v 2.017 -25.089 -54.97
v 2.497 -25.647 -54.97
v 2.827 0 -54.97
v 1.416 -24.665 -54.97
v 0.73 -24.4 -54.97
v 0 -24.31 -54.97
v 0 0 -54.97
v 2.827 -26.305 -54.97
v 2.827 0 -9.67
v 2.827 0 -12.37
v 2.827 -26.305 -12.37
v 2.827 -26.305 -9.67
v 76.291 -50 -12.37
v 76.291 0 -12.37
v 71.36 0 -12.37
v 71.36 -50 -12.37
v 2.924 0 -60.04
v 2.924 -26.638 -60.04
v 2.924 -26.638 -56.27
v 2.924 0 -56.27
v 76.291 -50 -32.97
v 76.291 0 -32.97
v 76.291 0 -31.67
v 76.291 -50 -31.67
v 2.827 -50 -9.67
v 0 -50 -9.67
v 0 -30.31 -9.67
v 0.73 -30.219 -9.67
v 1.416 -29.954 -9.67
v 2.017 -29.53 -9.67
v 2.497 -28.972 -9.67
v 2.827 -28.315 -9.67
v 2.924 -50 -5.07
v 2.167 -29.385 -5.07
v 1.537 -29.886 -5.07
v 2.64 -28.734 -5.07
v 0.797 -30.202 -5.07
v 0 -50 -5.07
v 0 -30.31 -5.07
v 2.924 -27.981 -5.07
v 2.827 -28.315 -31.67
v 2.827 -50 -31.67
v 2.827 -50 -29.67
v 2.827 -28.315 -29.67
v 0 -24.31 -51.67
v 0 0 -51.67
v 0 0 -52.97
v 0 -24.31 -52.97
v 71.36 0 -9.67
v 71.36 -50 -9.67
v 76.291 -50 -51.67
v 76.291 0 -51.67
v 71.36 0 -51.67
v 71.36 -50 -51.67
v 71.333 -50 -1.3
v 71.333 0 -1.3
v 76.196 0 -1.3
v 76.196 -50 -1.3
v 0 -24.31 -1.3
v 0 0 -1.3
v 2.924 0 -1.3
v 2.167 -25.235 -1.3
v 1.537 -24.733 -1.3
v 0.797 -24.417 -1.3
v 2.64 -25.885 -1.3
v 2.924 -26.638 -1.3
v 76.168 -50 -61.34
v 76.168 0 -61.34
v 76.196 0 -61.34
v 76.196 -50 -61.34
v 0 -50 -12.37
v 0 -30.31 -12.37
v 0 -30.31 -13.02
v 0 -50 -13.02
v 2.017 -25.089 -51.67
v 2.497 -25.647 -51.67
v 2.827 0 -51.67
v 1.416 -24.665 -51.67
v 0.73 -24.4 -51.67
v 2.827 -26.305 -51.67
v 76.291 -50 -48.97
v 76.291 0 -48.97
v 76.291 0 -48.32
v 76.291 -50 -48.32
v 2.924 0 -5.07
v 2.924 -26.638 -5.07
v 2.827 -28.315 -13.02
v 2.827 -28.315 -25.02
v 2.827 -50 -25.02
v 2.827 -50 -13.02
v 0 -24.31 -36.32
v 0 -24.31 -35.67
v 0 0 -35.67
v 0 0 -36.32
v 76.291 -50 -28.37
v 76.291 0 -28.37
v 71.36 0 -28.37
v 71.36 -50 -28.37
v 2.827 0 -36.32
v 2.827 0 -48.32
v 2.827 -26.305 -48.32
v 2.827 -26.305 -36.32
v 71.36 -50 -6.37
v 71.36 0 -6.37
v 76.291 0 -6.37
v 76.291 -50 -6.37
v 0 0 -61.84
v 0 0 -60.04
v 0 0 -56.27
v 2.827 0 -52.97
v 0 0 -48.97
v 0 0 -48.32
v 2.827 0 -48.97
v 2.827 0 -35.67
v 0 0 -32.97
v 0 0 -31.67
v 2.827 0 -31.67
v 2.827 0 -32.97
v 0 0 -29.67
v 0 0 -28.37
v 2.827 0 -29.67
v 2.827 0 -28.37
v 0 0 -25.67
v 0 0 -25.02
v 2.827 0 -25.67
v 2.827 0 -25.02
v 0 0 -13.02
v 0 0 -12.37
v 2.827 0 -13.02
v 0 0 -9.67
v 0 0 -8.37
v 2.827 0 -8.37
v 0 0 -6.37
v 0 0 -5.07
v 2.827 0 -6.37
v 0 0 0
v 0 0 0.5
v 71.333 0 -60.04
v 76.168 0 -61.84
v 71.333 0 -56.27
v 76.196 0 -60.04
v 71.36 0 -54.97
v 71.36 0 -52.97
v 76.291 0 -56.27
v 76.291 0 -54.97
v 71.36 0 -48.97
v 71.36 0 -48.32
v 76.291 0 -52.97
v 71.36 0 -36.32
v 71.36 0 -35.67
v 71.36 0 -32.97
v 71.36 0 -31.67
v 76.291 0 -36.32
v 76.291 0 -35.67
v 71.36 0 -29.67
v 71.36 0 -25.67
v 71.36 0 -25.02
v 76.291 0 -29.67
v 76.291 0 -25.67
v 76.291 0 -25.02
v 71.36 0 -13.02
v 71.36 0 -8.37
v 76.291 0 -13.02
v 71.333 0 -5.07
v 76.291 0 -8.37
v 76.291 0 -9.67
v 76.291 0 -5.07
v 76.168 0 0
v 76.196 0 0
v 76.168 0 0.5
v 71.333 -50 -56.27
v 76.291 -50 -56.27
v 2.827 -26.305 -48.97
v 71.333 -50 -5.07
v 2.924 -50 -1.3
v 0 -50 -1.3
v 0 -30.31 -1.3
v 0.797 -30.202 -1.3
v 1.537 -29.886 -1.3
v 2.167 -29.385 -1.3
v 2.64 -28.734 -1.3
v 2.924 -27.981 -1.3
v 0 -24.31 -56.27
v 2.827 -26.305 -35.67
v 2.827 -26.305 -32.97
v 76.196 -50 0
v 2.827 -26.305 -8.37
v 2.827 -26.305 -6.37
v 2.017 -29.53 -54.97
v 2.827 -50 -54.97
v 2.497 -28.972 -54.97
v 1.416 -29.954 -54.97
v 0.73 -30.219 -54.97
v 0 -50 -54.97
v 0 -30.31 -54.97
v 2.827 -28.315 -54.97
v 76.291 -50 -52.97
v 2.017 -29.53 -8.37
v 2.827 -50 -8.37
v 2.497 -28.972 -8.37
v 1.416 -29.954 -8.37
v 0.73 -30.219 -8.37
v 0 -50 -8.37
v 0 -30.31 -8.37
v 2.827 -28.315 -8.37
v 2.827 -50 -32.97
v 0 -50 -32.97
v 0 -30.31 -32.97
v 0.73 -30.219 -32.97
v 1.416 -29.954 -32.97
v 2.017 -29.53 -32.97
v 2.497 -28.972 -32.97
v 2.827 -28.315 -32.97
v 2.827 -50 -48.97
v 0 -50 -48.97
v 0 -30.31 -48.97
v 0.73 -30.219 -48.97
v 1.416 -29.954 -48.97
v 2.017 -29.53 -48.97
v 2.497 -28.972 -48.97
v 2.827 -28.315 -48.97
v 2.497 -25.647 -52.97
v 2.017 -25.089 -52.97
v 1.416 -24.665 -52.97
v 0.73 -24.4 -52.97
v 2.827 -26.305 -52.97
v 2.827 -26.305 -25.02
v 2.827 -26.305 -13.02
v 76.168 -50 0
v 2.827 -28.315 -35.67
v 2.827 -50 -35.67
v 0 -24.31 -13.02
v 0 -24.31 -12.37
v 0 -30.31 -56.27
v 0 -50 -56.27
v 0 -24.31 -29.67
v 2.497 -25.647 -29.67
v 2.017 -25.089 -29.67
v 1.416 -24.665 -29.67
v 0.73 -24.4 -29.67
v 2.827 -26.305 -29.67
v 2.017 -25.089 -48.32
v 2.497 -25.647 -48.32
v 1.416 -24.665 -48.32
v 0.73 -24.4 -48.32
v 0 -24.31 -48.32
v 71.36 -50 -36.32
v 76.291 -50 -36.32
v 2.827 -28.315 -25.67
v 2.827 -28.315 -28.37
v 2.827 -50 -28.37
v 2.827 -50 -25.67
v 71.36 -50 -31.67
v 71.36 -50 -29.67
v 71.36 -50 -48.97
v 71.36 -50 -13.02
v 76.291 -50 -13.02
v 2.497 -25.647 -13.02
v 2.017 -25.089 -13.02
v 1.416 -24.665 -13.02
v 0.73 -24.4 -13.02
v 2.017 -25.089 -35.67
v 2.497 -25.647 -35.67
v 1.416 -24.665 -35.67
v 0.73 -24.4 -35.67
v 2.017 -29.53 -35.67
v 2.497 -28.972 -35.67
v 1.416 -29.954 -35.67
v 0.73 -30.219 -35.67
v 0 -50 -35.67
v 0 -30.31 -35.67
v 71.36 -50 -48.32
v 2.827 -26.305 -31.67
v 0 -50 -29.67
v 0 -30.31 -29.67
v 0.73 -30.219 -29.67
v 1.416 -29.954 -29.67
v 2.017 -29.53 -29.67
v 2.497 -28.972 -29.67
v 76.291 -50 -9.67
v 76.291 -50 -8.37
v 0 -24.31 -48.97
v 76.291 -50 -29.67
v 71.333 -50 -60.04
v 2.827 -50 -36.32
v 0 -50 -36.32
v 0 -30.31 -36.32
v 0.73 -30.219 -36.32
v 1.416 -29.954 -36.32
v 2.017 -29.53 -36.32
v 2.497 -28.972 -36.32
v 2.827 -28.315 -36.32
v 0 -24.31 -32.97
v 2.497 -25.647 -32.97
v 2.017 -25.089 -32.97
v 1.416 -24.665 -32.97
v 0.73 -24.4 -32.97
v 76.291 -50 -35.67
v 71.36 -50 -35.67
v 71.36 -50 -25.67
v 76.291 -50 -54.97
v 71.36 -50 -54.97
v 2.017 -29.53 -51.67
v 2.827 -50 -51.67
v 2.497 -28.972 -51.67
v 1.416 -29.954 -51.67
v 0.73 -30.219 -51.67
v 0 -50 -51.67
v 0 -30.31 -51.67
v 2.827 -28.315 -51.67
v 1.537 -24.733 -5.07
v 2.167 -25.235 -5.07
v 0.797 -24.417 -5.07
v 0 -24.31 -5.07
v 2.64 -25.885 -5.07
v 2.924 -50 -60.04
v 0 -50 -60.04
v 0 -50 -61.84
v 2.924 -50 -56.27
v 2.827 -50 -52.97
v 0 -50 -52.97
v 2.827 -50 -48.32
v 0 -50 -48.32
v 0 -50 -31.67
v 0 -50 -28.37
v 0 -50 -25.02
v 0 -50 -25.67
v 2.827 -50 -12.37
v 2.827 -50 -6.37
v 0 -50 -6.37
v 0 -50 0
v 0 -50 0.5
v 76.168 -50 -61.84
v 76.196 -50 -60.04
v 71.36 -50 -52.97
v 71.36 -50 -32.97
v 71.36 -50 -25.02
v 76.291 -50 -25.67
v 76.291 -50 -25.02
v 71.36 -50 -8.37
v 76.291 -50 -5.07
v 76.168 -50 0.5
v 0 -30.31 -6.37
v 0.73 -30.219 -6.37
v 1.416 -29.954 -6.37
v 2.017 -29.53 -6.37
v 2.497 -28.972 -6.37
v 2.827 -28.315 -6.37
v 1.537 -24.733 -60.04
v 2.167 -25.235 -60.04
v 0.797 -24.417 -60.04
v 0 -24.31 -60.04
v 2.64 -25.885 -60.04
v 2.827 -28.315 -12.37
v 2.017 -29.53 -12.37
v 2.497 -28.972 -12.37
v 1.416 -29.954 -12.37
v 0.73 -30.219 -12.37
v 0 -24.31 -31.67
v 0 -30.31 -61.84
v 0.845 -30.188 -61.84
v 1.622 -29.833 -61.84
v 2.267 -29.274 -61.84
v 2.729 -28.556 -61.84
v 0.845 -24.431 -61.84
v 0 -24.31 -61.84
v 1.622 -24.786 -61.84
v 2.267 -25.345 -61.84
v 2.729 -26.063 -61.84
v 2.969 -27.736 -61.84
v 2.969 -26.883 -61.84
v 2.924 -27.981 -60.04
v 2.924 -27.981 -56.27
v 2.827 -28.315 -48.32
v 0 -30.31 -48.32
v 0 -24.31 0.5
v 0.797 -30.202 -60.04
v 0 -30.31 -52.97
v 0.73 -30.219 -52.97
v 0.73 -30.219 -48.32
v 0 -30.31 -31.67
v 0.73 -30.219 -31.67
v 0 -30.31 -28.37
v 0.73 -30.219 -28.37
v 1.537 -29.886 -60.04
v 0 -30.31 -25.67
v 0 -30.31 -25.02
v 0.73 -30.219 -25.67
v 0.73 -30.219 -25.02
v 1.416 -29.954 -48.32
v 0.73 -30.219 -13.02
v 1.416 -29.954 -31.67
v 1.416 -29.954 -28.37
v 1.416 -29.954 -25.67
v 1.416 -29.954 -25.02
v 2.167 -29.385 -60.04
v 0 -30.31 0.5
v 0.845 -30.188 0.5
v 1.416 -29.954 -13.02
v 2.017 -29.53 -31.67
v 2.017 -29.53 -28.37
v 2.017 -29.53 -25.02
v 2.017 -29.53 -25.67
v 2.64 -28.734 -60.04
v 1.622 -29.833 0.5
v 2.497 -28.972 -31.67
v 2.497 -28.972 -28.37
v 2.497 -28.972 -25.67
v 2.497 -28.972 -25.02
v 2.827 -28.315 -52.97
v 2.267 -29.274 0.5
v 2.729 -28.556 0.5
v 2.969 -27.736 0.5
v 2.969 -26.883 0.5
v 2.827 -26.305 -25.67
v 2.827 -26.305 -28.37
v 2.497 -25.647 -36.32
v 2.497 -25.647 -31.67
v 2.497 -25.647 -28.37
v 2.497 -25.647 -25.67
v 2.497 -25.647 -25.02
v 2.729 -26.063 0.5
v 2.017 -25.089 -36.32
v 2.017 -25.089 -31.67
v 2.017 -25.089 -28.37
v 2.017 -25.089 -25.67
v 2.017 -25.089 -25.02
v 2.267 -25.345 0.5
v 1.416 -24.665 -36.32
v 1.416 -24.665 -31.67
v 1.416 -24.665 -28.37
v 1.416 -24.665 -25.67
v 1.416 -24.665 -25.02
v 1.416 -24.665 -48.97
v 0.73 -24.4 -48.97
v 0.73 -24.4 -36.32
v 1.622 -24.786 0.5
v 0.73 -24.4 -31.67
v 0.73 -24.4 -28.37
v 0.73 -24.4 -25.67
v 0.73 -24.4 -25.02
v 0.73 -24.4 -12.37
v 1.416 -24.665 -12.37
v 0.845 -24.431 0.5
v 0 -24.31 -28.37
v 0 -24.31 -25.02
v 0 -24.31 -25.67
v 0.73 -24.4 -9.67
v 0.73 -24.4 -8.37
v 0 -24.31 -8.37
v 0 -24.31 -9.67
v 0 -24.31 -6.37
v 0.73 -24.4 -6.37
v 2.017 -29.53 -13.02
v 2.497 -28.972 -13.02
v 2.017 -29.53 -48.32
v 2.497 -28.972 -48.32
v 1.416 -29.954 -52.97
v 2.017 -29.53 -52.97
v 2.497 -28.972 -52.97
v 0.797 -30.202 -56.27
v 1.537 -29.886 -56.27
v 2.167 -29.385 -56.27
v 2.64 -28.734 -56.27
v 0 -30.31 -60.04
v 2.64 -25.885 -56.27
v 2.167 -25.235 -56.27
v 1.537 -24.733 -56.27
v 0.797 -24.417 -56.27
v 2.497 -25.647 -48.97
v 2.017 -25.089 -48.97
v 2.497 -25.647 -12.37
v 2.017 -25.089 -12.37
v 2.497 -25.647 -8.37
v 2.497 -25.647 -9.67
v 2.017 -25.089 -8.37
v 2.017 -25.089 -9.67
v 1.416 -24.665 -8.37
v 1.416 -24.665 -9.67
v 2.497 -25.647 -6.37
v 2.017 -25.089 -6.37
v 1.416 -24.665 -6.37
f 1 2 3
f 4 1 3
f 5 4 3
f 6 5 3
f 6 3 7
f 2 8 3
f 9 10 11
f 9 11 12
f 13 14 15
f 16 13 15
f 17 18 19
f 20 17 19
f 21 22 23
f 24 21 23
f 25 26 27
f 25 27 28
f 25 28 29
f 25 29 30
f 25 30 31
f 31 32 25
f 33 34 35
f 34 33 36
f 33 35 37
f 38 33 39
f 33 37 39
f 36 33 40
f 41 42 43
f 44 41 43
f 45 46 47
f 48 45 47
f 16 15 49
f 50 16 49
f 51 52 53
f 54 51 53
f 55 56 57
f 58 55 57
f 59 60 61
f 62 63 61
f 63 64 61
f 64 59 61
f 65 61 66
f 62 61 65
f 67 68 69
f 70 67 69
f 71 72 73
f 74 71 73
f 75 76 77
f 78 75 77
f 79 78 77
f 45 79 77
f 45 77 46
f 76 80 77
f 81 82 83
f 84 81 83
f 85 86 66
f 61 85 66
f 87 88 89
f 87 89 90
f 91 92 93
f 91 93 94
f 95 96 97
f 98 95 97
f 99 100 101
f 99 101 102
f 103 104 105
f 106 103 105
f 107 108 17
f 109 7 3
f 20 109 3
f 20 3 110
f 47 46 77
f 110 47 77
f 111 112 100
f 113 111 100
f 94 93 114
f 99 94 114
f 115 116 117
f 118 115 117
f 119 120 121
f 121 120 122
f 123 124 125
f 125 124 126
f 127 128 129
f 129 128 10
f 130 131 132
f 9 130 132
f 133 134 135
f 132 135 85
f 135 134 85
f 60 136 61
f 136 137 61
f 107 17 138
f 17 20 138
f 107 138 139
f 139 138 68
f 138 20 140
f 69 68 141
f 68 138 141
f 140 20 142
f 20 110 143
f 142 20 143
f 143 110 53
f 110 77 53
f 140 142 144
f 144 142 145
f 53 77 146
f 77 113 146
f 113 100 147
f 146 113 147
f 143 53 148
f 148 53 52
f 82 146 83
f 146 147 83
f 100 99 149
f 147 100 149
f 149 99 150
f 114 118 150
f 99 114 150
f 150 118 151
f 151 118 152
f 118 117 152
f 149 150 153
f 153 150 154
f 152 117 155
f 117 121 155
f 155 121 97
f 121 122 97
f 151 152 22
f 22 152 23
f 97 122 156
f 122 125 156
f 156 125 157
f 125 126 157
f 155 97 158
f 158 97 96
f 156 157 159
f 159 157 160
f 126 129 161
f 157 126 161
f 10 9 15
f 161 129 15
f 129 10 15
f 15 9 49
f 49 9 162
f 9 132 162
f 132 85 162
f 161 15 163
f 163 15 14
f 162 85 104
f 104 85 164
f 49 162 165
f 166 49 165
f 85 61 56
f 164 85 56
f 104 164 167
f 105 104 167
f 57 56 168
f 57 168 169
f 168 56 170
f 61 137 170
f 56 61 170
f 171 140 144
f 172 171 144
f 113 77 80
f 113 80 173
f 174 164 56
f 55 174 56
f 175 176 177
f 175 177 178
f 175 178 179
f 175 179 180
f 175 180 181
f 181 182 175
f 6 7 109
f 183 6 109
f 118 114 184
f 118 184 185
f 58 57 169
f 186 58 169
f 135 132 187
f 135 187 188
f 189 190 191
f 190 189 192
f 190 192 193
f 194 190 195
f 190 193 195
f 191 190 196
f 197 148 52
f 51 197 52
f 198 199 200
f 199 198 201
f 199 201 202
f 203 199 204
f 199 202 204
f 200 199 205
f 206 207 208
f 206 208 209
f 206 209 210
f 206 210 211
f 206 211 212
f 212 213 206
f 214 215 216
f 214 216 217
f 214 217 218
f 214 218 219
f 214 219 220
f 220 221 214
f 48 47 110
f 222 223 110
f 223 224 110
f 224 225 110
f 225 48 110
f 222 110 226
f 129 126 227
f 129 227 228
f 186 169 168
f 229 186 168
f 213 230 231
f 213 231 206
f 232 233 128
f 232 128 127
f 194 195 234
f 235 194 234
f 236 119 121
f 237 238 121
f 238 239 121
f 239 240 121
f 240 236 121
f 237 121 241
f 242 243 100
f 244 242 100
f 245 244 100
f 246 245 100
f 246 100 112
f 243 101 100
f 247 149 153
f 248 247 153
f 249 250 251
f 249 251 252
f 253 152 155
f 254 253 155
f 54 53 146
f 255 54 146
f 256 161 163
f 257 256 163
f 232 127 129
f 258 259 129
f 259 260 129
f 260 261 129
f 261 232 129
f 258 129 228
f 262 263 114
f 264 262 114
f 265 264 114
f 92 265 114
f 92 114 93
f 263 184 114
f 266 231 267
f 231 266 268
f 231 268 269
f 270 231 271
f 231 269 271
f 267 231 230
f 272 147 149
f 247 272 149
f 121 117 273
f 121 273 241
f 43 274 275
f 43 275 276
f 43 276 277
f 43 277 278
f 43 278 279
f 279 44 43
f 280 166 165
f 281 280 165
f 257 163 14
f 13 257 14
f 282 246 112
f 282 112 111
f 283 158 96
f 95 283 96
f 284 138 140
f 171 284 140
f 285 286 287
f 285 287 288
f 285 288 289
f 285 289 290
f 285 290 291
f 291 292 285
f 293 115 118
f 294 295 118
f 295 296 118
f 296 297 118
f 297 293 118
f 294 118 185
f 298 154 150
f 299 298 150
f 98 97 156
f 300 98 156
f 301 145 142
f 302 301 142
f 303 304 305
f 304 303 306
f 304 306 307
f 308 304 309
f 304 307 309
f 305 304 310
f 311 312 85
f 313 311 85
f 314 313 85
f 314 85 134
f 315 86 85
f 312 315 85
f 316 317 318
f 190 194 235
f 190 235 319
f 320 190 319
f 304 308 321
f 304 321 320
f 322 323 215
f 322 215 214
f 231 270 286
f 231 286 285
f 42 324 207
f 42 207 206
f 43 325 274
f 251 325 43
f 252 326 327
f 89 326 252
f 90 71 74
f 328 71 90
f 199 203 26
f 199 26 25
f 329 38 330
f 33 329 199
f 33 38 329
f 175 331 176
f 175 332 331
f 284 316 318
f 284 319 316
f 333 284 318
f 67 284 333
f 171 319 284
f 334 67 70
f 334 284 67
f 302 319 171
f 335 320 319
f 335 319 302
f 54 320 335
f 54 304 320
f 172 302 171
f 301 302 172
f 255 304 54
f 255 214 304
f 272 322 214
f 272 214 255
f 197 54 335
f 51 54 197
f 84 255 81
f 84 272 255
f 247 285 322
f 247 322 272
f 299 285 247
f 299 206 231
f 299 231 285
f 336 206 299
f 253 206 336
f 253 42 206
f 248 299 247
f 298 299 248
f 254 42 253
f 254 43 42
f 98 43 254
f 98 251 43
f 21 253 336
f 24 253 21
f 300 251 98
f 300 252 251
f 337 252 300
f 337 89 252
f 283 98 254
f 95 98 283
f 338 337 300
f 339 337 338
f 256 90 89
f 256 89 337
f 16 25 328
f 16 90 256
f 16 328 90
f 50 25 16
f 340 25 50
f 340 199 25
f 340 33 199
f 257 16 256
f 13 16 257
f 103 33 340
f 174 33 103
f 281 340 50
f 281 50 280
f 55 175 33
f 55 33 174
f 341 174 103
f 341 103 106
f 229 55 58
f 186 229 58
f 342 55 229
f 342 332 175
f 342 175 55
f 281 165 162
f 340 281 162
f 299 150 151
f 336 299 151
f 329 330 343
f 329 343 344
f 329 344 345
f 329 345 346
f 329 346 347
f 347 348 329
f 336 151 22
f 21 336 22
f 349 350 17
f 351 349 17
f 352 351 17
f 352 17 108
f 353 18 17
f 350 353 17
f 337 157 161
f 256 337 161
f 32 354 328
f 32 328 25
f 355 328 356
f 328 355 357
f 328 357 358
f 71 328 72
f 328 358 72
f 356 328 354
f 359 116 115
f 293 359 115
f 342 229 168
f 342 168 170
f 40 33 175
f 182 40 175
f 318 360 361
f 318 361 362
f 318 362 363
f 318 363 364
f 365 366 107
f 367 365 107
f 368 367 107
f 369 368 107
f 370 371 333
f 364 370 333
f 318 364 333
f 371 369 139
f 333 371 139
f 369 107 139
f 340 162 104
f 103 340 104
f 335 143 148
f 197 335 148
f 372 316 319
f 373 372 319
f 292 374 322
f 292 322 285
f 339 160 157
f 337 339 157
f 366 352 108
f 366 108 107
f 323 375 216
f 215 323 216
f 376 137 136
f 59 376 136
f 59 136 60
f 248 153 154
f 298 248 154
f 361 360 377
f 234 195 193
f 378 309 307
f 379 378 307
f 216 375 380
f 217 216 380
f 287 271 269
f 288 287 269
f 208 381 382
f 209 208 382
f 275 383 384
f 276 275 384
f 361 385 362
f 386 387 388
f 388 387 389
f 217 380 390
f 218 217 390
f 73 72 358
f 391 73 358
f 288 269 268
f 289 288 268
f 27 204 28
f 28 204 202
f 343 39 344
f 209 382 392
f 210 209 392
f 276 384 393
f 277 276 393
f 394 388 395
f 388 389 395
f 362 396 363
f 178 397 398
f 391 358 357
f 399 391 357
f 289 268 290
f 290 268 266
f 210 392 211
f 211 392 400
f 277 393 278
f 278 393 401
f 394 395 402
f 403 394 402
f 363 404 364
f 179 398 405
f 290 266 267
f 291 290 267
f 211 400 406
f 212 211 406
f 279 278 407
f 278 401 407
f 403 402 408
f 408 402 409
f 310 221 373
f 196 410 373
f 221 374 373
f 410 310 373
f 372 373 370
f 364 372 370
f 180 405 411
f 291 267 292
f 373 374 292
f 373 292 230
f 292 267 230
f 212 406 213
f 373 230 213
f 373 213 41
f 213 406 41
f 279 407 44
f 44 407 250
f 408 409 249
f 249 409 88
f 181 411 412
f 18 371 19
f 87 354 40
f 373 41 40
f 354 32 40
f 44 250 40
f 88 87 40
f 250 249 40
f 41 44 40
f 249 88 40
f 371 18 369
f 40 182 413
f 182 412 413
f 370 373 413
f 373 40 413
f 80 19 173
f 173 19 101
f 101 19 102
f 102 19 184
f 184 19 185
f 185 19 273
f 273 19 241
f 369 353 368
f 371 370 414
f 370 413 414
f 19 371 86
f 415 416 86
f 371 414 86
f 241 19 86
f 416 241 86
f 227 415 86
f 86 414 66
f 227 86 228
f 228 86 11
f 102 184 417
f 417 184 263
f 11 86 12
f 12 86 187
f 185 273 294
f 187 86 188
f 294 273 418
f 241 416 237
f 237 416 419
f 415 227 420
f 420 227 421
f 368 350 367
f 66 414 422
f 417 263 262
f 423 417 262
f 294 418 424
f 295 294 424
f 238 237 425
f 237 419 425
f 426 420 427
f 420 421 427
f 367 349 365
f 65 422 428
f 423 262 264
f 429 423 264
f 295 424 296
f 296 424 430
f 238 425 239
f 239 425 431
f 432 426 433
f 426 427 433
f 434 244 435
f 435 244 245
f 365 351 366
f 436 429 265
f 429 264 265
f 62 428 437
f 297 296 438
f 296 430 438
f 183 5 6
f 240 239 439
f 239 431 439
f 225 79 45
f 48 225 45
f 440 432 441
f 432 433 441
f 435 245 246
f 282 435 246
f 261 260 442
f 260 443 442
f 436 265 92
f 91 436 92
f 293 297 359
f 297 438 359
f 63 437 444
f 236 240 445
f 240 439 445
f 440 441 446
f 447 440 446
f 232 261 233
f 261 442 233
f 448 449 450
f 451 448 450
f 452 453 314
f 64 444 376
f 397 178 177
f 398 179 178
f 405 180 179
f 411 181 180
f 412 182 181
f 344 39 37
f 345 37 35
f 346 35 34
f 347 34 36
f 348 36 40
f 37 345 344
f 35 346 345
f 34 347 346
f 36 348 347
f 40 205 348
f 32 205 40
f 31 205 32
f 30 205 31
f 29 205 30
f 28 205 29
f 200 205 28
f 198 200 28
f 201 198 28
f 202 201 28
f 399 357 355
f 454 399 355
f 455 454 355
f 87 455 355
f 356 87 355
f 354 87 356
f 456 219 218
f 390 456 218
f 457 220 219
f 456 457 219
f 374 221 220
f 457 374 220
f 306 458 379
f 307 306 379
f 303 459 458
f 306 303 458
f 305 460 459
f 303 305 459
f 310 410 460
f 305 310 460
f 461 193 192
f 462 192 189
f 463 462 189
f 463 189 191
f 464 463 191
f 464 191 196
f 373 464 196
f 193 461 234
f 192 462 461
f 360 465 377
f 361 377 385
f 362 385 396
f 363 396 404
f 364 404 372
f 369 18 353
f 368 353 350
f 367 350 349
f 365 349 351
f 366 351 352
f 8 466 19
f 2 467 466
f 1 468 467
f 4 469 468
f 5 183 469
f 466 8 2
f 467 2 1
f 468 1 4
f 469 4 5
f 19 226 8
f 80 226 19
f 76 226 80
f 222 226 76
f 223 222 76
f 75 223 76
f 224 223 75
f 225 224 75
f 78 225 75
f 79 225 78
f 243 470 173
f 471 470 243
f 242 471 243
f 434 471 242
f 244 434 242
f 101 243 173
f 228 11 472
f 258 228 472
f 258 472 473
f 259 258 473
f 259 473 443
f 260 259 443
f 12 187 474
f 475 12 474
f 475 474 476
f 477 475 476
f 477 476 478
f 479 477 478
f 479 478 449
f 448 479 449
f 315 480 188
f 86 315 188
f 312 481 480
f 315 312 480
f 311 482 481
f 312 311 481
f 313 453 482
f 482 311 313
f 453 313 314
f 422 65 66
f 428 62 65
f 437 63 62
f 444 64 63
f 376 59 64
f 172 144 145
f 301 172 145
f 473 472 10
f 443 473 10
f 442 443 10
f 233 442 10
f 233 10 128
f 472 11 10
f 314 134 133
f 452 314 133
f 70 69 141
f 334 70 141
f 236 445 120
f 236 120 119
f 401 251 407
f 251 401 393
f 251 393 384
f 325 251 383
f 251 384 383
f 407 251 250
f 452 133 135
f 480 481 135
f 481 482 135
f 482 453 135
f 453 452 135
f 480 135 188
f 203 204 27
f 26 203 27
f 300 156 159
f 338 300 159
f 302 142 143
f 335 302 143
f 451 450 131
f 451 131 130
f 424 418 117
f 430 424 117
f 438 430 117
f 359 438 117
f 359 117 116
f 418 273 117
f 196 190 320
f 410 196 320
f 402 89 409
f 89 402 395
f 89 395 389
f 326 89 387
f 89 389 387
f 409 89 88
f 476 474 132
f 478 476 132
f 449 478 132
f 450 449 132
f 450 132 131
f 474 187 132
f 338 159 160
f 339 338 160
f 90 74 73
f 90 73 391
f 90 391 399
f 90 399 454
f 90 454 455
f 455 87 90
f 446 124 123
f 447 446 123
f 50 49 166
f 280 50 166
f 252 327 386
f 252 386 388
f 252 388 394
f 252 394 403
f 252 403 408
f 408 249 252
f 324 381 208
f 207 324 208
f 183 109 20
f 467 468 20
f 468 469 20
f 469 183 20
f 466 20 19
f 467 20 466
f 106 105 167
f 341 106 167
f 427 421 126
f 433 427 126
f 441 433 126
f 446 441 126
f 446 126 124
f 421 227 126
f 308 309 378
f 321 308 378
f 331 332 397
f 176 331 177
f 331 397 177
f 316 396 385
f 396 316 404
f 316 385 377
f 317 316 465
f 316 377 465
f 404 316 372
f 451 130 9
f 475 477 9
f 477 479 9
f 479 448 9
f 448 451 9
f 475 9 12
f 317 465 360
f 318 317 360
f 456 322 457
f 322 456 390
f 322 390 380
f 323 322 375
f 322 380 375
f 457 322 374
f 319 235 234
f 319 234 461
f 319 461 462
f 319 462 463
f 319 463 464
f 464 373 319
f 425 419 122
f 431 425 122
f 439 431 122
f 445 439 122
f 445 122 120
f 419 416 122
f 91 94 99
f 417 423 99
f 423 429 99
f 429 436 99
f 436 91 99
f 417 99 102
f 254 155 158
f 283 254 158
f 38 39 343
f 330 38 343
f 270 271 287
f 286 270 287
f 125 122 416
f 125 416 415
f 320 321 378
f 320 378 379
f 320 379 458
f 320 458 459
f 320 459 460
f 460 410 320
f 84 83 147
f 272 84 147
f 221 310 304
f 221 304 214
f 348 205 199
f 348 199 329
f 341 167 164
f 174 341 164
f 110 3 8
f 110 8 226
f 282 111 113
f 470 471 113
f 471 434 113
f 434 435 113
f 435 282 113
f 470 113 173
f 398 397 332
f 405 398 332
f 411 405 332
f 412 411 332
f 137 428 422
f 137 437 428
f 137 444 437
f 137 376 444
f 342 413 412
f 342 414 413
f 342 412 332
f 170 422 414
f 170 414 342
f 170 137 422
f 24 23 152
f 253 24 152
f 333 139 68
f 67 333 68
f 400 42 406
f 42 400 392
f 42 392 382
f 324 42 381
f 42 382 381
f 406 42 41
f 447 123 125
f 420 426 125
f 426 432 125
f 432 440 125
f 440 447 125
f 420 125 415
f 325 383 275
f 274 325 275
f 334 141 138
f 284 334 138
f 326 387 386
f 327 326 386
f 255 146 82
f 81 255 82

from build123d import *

# Parameters (mm, degrees)
F0_W          = 76.1676803231
F0_H          = 0.5
F0_W_2        = 68.4088433627
F0_H_2        = 3.77
F0_W_3        = 68.5331546701
F0_H_3        = 2.7
F0_H_4        = 2
F0_H_5        = 12
F1_DEPTH      = 50
F2_R          = 3
F3_DEPTH      = 70
F3_DEPTH_BACK = 0.501


with BuildPart() as f1:
    # F0 (on Front) → F1 (new body)
    with BuildSketch(Plane.XZ):
        Polygon((76.1676803231, 0), (0, 0), (0, -1.3), (2.9238497373, -1.3), (71.3326931, -1.3), (76.1956498027, -1.3), (76.1956498027, 0), align=None)
        Polygon((71.3326931, -60.04), (2.9238497373, -60.04), (0, -60.04), (0, -61.34), (76.1676803231, -61.34), (76.1956498027, -61.34), (76.1956498027, -60.04), align=None)
        Polygon((71.3326931, -5.07), (2.9238497373, -5.07), (0, -5.07), (0, -6.37), (2.8266510926, -6.37), (71.3598057628, -6.37), (76.290667057, -6.37), (76.290667057, -5.07), align=None)
        Polygon((71.3598057628, -8.37), (2.8266510926, -8.37), (0, -8.37), (0, -9.67), (2.8266510926, -9.67), (71.3598057628, -9.67), (76.290667057, -9.67), (76.290667057, -8.37), align=None)
        Polygon((71.3598057628, -51.67), (2.8266510926, -51.67), (0, -51.67), (0, -52.97), (2.8266510926, -52.97), (71.3598057628, -52.97), (76.290667057, -52.97), (76.290667057, -51.67), align=None)
        Polygon((71.3598057628, -12.37), (2.8266510926, -12.37), (0, -12.37), (0, -13.02), (2.8266510926, -13.02), (71.3598057628, -13.02), (76.290667057, -13.02), (76.290667057, -12.37), align=None)
        Polygon((71.3598057628, -25.02), (2.8266510926, -25.02), (0, -25.02), (0, -25.67), (2.8266510926, -25.67), (71.3598057628, -25.67), (76.290667057, -25.67), (76.290667057, -25.02), align=None)
        Polygon((71.3598057628, -54.97), (2.8266510926, -54.97), (0, -54.97), (0, -56.27), (2.9238497373, -56.27), (71.3326931, -56.27), (76.290667057, -56.27), (76.290667057, -54.97), align=None)
        Polygon((71.3598057628, -31.67), (2.8266510926, -31.67), (0, -31.67), (0, -32.97), (2.8266510926, -32.97), (71.3598057628, -32.97), (76.290667057, -32.97), (76.290667057, -31.67), align=None)
        Polygon((71.3598057628, -28.37), (2.8266510926, -28.37), (0, -28.37), (0, -29.67), (2.8266510926, -29.67), (71.3598057628, -29.67), (76.290667057, -29.67), (76.290667057, -28.37), align=None)
        with Locations((38.0838401616, 0.25)):
            Rectangle(F0_W, F0_H)
        with Locations((38.0838401616, -61.59)):
            Rectangle(F0_W, F0_H)
        Polygon((71.3598057628, -48.32), (2.8266510926, -48.32), (0, -48.32), (0, -48.97), (2.8266510926, -48.97), (71.3598057628, -48.97), (76.290667057, -48.97), (76.290667057, -48.32), align=None)
        Polygon((71.3598057628, -35.67), (2.8266510926, -35.67), (0, -35.67), (0, -36.32), (2.8266510926, -36.32), (71.3598057628, -36.32), (76.290667057, -36.32), (76.290667057, -35.67), align=None)
        with Locations((37.1282714186, -58.155)):
            Rectangle(F0_W_2, F0_H_2)
        with Locations((37.0932284277, -11.02)):
            Rectangle(F0_W_3, F0_H_3)
        with Locations((37.0932284277, -7.37)):
            Rectangle(F0_W_3, F0_H_4)
        with Locations((37.0932284277, -42.32)):
            Rectangle(F0_W_3, F0_H_5)
        with Locations((37.0932284277, -34.32)):
            Rectangle(F0_W_3, F0_H_3)
        with Locations((37.0932284277, -53.97)):
            Rectangle(F0_W_3, F0_H_4)
        with Locations((37.0932284277, -27.02)):
            Rectangle(F0_W_3, F0_H_3)
        with Locations((37.0932284277, -30.67)):
            Rectangle(F0_W_3, F0_H_4)
        with Locations((37.0932284277, -19.02)):
            Rectangle(F0_W_3, F0_H_5)
        with Locations((37.0932284277, -50.32)):
            Rectangle(F0_W_3, F0_H_3)
        with Locations((37.1282714186, -3.185)):
            Rectangle(F0_W_2, F0_H_2)
    extrude(amount=F1_DEPTH)

    # F2 (on Top) → F3 (cut, two sides)
    with BuildSketch(Plane.XY) as f3_sk:
        with Locations((0, -27.3095168173)):
            Circle(F2_R)
    extrude(amount=-F3_DEPTH, mode=Mode.SUBTRACT)
    extrude(f3_sk.sketch, amount=F3_DEPTH_BACK, mode=Mode.SUBTRACT)


solid = f1.part
